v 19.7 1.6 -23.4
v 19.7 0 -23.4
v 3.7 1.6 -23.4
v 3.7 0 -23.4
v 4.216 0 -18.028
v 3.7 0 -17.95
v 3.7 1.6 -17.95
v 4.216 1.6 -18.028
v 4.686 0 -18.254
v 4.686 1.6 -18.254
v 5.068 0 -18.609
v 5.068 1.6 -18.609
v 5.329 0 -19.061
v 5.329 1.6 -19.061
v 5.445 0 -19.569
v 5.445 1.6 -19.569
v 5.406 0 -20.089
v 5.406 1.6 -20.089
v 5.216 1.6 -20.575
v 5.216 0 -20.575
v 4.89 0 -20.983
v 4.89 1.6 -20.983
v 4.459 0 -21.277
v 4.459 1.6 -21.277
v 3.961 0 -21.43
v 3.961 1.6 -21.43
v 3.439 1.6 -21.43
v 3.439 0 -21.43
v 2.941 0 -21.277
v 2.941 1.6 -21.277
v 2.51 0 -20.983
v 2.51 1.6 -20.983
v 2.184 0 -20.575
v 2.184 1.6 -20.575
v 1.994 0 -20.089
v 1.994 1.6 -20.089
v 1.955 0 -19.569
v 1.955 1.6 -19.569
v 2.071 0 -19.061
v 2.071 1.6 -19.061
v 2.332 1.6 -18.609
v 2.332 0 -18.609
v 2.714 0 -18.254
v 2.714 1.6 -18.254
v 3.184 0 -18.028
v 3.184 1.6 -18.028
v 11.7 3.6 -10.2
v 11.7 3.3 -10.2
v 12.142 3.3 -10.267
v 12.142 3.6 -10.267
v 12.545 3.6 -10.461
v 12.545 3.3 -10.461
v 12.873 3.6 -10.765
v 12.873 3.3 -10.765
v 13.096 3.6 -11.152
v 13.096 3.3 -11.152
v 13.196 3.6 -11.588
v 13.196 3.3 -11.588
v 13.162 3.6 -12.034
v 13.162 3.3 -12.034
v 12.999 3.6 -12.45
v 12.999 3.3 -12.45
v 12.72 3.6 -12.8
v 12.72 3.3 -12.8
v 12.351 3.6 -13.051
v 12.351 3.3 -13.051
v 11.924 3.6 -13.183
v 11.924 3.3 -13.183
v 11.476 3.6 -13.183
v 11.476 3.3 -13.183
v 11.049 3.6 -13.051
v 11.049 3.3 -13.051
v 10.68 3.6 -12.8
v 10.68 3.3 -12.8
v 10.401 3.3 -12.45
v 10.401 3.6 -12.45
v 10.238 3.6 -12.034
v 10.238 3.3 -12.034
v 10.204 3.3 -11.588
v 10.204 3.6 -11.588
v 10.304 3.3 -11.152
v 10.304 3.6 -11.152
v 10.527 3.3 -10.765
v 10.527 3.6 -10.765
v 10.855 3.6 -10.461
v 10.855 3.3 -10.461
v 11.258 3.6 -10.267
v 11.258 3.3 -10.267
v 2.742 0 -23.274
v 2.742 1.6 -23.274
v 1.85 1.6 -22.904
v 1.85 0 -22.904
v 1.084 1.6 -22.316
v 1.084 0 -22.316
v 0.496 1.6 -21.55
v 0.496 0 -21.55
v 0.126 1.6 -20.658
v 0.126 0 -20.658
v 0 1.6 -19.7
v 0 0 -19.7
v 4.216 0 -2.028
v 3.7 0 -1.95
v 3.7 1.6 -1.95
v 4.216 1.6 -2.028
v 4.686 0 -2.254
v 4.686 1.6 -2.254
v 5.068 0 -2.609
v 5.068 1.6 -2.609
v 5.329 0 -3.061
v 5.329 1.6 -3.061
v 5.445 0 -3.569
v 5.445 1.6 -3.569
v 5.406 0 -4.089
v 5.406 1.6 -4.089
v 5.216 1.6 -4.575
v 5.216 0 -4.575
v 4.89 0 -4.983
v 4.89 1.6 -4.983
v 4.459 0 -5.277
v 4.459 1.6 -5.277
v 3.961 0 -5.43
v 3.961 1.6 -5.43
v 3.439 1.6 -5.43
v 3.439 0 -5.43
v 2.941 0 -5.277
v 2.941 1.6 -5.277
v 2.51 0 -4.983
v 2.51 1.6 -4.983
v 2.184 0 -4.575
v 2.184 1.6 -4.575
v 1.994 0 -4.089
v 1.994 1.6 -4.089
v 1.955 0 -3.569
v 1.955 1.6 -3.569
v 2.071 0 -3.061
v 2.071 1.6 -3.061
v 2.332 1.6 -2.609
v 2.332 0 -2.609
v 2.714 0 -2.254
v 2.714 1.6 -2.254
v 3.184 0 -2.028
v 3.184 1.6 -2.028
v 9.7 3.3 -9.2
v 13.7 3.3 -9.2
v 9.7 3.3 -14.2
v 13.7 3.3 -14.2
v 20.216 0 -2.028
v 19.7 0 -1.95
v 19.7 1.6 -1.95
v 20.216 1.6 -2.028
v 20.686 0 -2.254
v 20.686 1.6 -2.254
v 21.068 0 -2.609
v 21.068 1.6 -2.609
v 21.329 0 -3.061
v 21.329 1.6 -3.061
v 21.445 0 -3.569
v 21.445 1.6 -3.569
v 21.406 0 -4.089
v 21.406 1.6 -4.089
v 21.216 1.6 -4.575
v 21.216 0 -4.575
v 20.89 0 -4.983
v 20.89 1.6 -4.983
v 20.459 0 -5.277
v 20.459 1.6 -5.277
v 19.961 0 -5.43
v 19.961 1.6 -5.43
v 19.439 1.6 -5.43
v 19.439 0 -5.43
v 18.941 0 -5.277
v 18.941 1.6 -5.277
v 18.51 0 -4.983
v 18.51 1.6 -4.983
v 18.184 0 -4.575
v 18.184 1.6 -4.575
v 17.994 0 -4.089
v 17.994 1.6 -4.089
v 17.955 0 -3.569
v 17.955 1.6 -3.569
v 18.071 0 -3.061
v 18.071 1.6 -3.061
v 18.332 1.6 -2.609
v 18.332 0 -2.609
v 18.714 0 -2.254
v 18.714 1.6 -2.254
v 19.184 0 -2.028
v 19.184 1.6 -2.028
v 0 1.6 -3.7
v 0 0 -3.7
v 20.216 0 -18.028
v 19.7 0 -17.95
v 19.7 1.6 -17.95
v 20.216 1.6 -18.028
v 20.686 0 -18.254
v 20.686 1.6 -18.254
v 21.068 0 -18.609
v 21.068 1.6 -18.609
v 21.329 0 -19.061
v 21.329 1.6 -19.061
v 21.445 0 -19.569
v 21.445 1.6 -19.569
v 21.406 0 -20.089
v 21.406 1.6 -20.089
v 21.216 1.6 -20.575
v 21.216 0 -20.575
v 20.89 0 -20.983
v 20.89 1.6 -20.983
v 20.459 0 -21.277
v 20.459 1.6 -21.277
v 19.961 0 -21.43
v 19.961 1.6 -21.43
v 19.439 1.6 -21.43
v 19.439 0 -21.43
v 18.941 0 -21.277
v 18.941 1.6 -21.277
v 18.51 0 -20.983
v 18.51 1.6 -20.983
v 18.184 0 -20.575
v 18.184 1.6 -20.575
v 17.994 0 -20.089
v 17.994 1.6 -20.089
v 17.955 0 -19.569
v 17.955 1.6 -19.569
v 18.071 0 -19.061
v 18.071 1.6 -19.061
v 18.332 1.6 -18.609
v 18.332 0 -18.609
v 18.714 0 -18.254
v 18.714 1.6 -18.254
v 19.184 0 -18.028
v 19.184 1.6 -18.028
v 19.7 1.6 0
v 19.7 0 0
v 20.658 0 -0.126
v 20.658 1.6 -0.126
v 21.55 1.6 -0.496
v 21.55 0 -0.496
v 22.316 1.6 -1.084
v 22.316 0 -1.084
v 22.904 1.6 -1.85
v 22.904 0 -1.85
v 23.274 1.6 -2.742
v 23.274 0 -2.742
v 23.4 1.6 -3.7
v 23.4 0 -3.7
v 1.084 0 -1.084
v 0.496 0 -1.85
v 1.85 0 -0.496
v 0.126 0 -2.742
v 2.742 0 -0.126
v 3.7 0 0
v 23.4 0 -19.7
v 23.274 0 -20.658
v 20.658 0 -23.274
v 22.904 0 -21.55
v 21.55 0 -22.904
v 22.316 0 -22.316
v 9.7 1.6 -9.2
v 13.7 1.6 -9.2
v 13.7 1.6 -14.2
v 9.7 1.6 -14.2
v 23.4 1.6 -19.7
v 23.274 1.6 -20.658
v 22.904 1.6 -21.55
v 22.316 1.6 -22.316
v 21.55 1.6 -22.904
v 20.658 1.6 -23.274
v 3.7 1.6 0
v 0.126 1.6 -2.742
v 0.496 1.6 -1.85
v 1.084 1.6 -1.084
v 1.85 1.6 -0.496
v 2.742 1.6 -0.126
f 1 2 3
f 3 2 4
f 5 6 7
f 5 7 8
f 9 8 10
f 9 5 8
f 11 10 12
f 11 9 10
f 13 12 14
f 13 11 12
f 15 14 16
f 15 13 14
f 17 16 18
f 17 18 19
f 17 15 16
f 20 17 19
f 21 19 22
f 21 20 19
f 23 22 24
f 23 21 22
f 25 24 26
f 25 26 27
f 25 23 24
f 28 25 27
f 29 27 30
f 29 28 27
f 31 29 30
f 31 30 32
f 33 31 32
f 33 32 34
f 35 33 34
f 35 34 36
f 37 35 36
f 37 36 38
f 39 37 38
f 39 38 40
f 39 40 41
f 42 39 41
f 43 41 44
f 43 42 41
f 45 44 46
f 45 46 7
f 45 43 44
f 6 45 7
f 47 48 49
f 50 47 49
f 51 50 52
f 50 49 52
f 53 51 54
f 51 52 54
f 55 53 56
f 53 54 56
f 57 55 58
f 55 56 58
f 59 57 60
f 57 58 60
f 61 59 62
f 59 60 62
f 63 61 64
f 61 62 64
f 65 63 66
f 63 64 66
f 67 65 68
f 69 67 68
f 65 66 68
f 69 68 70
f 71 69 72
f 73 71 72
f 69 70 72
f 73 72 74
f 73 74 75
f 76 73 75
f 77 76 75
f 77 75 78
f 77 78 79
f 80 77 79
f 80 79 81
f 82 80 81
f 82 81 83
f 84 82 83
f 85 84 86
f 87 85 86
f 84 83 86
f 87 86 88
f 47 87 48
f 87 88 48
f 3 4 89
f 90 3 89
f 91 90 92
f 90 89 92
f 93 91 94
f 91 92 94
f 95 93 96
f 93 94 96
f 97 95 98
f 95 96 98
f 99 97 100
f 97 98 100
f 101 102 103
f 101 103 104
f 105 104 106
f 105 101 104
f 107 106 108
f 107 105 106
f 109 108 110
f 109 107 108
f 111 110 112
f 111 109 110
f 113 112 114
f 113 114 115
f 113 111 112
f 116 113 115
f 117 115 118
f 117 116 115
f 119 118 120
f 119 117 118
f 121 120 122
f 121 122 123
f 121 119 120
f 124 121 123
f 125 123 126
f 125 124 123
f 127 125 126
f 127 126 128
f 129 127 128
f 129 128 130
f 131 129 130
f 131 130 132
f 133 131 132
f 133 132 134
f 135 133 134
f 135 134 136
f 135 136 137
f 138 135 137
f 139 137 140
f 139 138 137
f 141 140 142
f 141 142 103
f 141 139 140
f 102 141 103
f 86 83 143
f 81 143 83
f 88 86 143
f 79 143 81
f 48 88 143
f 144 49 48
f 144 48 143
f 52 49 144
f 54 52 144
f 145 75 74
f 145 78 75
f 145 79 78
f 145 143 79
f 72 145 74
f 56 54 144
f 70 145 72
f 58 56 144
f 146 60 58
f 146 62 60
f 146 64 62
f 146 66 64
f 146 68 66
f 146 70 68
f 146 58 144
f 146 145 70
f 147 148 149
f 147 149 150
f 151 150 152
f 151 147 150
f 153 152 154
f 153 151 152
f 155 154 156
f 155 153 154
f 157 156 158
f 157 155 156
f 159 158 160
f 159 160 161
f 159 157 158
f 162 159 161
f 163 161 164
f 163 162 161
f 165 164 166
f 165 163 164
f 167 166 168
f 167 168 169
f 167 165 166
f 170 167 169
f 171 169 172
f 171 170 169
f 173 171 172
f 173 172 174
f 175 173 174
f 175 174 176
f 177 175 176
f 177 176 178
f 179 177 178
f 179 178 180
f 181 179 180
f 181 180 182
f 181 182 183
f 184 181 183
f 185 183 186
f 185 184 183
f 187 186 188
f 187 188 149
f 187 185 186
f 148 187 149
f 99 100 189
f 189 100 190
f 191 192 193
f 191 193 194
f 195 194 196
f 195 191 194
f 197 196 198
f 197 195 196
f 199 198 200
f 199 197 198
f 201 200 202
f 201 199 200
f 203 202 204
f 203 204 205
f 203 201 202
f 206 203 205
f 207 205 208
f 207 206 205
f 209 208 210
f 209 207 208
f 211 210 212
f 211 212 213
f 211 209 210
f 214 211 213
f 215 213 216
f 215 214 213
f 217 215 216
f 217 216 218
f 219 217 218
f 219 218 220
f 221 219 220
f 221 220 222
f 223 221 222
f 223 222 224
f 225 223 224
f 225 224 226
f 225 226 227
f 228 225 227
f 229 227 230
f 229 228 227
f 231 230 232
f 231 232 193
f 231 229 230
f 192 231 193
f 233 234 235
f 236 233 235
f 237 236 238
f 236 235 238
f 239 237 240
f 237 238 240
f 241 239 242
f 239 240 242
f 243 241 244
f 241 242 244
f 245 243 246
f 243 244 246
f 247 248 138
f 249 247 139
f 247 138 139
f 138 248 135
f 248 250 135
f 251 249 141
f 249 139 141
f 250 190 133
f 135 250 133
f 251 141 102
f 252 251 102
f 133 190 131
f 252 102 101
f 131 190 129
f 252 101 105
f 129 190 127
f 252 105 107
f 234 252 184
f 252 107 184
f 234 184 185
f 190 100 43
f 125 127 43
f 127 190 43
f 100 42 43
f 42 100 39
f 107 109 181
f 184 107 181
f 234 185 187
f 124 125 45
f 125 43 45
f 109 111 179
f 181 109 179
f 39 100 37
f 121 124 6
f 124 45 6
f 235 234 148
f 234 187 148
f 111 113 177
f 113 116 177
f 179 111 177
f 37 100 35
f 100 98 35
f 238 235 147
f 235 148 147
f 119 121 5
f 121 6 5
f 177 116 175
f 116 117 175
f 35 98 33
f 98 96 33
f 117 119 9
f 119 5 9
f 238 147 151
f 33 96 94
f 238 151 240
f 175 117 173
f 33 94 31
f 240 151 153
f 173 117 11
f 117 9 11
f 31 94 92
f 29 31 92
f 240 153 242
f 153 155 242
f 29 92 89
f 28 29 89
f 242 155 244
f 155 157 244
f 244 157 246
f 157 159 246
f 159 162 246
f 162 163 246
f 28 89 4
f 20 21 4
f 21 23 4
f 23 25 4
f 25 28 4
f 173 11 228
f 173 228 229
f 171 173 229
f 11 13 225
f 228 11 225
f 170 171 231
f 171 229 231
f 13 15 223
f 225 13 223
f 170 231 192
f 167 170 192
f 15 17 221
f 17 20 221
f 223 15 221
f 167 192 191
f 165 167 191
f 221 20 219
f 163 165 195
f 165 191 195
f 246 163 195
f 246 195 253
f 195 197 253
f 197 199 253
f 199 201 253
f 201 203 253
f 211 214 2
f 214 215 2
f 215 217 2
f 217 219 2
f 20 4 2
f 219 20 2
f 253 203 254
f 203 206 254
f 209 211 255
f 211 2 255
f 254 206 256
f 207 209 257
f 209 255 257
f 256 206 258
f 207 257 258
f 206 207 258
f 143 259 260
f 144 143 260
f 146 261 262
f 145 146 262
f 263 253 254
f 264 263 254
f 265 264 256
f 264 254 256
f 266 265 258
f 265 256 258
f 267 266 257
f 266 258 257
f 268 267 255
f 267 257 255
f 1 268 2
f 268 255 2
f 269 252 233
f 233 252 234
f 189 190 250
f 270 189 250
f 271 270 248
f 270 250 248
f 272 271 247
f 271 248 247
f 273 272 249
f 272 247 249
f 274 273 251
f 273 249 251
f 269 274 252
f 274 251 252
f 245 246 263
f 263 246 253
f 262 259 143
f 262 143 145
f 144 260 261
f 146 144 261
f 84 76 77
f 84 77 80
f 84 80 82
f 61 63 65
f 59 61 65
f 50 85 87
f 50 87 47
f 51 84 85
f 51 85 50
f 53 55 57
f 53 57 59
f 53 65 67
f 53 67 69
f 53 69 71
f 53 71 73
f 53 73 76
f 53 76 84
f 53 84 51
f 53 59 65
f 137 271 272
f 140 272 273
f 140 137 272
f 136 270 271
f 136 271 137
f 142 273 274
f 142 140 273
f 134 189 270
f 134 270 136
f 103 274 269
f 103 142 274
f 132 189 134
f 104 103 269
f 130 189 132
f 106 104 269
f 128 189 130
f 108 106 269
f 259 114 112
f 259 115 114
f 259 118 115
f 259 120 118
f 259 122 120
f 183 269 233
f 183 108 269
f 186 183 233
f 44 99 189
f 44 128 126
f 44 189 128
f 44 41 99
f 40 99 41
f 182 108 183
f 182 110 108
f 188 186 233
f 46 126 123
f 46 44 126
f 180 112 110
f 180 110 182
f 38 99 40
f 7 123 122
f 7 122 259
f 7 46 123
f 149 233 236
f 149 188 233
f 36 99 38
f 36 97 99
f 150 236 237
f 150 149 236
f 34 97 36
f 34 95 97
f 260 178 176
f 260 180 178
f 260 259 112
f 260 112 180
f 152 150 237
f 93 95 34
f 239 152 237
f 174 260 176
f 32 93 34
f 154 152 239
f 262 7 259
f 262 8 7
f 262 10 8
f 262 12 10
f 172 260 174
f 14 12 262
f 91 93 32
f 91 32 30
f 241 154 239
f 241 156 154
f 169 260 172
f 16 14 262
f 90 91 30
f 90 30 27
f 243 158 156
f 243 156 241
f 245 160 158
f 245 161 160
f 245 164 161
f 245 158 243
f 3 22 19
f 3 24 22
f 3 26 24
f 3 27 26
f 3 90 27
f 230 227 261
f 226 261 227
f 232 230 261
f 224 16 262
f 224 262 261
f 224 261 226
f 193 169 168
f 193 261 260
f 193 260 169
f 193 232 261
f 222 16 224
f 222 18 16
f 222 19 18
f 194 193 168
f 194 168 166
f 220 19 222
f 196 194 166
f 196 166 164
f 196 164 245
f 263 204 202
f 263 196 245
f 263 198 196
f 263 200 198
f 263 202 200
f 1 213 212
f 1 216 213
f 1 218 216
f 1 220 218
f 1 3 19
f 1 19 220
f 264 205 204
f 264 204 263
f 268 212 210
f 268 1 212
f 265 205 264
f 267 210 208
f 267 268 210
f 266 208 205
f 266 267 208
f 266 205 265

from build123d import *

# Parameters (mm, degrees)
SKETCH1_R           = 1.75
BOSS_EXTRUDE1_DEPTH = 1.6
SKETCH2_W           = 2
SKETCH2_H           = 5
BOSS_EXTRUDE2_DEPTH = 1.7
SKETCH3_R           = 1.5
BOSS_EXTRUDE3_DEPTH = 0.3


with BuildPart() as part:
    # Sketch1 → Boss-Extrude1 (new body)
    with BuildSketch(Plane(origin=(0, 0, 0), x_dir=(1, 0, 0), z_dir=(0, 1, 0))):
        with BuildLine():
            Line((3.7, 0), (19.7, 0))
            ThreePointArc((19.7, 0), (22.31629509, 1.08370491), (23.4, 3.7))
            Line((23.4, 3.7), (23.4, 19.7))
            ThreePointArc((23.4, 19.7), (22.31629509, 22.31629509), (19.7, 23.4))
            Line((19.7, 23.4), (3.7, 23.4))
            ThreePointArc((3.7, 23.4), (1.08370491, 22.31629509), (0, 19.7))
            Line((0, 19.7), (0, 3.7))
            ThreePointArc((0, 3.7), (1.08370491, 1.08370491), (3.7, 0))
        make_face()
        with Locations(Location((3.7, 19.7, 0), (0, 0, 270))):
            Circle(SKETCH1_R, mode=Mode.SUBTRACT)
        with Locations(Location((19.7, 19.7, 0), (0, 0, 270))):
            Circle(SKETCH1_R, mode=Mode.SUBTRACT)
        with Locations(Location((19.7, 3.7, 0), (0, 0, 270))):
            Circle(SKETCH1_R, mode=Mode.SUBTRACT)
        with Locations(Location((3.7, 3.7, 0), (0, 0, 270))):
            Circle(SKETCH1_R, mode=Mode.SUBTRACT)
    extrude(amount=BOSS_EXTRUDE1_DEPTH)

    # Sketch2 → Boss-Extrude2 (add)
    with BuildSketch(Plane(origin=(0, 1.6, 0), x_dir=(1, 0, 0), z_dir=(0, 1, 0))):
        with Locations((12.7, 11.7)):
            Rectangle(SKETCH2_W, SKETCH2_H)
        with Locations((10.7, 11.7)):
            Rectangle(SKETCH2_W, SKETCH2_H)
    extrude(amount=BOSS_EXTRUDE2_DEPTH)

    # Sketch3 → Boss-Extrude3 (add)
    with BuildSketch(Plane(origin=(0, 3.3, 0), x_dir=(1, 0, 0), z_dir=(0, 1, 0))):
        with Locations(Location((11.7, 11.7, 0), (0, 0, 270))):
            Circle(SKETCH3_R)
    extrude(amount=BOSS_EXTRUDE3_DEPTH)


solid = part.part
